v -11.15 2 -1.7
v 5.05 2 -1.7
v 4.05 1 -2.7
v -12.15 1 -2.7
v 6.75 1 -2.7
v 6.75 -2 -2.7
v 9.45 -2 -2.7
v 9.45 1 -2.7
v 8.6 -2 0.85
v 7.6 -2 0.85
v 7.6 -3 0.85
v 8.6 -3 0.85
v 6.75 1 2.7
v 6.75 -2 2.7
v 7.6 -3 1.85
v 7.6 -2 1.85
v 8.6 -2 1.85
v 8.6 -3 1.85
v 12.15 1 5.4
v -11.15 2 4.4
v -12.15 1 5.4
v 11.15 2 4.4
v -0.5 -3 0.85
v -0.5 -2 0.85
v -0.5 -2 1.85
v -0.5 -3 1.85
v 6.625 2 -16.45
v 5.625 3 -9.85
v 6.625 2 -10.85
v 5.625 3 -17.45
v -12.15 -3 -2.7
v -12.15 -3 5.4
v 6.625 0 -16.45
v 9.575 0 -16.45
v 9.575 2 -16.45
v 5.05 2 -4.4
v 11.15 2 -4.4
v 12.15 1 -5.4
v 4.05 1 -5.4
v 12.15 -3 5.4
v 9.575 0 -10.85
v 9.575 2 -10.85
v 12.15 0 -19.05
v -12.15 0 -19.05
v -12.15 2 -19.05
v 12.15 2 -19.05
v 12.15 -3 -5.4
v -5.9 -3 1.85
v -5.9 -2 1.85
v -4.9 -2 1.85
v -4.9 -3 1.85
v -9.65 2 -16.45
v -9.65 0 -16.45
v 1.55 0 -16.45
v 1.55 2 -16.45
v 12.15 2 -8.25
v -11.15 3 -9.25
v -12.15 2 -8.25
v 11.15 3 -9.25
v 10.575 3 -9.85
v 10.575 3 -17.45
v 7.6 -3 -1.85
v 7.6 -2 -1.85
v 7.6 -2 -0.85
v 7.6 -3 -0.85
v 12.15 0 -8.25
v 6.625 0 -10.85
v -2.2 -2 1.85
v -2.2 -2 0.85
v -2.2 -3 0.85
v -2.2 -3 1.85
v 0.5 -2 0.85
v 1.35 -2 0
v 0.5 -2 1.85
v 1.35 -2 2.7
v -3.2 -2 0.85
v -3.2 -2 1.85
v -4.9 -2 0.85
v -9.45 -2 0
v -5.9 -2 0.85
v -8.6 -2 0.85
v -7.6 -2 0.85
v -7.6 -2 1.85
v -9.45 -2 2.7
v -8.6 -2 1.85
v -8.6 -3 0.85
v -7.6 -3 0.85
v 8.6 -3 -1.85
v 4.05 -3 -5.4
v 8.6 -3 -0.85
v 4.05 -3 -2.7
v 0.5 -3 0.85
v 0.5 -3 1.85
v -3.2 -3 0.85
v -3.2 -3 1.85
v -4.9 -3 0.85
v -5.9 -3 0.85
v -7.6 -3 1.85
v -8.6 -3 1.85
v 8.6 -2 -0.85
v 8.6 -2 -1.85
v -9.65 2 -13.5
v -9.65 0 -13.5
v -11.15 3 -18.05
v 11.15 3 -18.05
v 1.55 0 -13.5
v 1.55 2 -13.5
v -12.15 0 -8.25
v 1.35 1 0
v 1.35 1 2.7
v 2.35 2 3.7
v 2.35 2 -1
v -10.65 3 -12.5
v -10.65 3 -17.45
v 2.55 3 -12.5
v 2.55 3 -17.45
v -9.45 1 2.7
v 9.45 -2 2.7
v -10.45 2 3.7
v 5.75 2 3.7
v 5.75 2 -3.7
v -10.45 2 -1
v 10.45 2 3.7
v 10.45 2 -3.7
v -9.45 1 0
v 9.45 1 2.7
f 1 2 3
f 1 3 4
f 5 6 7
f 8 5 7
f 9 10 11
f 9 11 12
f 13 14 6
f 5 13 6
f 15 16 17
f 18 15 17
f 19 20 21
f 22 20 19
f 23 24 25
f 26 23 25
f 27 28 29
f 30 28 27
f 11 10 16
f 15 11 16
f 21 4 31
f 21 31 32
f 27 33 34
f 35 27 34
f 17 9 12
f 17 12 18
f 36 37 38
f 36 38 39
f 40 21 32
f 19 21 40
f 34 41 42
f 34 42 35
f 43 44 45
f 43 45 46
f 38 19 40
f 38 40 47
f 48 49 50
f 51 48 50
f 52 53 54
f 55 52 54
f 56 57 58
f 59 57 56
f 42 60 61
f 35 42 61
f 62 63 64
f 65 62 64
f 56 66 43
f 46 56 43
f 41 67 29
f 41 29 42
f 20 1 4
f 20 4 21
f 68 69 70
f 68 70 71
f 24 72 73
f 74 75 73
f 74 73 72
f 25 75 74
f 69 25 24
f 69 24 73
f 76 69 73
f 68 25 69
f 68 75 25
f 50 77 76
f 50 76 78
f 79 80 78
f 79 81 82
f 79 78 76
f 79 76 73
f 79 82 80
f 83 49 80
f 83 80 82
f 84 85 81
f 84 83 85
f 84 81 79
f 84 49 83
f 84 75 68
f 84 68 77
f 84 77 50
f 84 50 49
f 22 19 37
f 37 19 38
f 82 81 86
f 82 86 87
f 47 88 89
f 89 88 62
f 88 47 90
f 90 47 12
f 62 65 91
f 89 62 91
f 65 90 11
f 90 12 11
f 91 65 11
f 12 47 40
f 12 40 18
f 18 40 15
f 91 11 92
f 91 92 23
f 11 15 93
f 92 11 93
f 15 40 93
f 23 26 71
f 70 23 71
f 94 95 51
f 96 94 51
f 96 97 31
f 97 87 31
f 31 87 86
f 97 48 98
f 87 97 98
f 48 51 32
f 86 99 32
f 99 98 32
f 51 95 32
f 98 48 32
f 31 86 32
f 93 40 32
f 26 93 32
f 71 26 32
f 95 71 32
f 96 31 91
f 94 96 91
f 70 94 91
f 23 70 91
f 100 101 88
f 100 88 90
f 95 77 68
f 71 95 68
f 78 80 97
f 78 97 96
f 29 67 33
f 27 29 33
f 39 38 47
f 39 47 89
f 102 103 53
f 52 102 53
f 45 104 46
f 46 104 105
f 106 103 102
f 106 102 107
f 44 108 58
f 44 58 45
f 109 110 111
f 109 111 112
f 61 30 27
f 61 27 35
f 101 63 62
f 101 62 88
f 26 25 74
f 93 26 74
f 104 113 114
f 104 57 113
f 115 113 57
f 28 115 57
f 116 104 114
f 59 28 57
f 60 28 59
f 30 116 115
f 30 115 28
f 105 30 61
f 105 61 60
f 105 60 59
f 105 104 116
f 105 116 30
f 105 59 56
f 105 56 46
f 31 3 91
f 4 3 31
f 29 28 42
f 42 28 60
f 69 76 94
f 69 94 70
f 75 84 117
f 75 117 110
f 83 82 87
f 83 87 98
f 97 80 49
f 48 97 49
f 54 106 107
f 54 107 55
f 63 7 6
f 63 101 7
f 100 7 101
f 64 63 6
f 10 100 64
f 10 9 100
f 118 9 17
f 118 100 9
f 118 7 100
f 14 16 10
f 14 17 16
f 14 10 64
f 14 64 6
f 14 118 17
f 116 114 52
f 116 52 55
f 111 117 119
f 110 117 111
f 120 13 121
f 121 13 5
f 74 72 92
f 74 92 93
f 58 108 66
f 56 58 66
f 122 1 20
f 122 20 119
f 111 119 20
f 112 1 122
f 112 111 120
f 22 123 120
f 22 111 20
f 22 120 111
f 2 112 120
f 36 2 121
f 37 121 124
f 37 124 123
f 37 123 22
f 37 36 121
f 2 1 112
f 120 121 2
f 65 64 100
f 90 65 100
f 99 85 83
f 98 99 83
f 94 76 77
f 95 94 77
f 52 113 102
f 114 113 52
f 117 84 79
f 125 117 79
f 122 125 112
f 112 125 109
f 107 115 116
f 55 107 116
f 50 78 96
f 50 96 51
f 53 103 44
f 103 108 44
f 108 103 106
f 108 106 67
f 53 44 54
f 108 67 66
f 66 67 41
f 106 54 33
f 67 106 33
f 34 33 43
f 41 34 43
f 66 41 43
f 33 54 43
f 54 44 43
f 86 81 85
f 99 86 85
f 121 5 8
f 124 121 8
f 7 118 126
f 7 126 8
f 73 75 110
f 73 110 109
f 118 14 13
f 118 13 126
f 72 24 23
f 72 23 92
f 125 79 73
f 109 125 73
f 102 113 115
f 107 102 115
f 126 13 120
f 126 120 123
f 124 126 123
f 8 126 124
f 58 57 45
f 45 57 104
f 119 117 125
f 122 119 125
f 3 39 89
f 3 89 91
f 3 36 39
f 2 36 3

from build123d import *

# Parameters (mm, degrees)
BOSS_EXTRUDE1_DEPTH      = 2
BOSS_EXTRUDE1_DEPTH_BACK = 2
SKETCH1_W                = 2.7
SKETCH1_H                = 5.4
SKETCH1_W_2              = 10.8
SKETCH1_H_2              = 2.7
SKETCH2_W                = 1
SKETCH2_H                = 1
BOSS_EXTRUDE2_DEPTH      = 1
CHAMFER3_SIZE            = 1
SKETCH3_W                = 24.3
SKETCH3_H                = 10.8
SKETCH3_W_2              = 11.2
SKETCH3_H_2              = 2.95
SKETCH3_W_3              = 2.95
SKETCH3_H_3              = 5.6
BOSS_EXTRUDE3_DEPTH      = 3
CHAMFER4_SIZE            = 1


with BuildPart() as part:
    # Sketch1 → Boss-Extrude1 (new, two sides: drawn at the far end of the back side and taken through both)
    with BuildSketch(Plane(origin=(0, 0, 0), x_dir=(1, 0, 0), z_dir=(0, 1, 0)).offset(-BOSS_EXTRUDE1_DEPTH_BACK)):
        Polygon((-12.15, -5.4), (12.15, -5.4), (12.15, 5.4), (4.05, 5.4), (4.05, 2.7), (-12.15, 2.7), align=None)
        with Locations((8.1, 0)):
            Rectangle(SKETCH1_W, SKETCH1_H, mode=Mode.SUBTRACT)
        with Locations((-4.05, -1.35)):
            Rectangle(SKETCH1_W_2, SKETCH1_H_2, mode=Mode.SUBTRACT)
    extrude(amount=BOSS_EXTRUDE1_DEPTH + BOSS_EXTRUDE1_DEPTH_BACK)

    # Sketch2 → Boss-Extrude2 (add)
    with BuildSketch(Plane.XZ.offset(2)):
        Polygon((-12.15, 5.4), (12.15, 5.4), (12.15, -5.4), (4.05, -5.4), (4.05, -2.7), (-12.15, -2.7), align=None)
        with Locations((-8.1, 1.35)):
            Rectangle(SKETCH2_W, SKETCH2_H, mode=Mode.SUBTRACT)
        with Locations((-5.4, 1.35)):
            Rectangle(SKETCH2_W, SKETCH2_H, mode=Mode.SUBTRACT)
        with Locations((-2.7, 1.35)):
            Rectangle(SKETCH2_W, SKETCH2_H, mode=Mode.SUBTRACT)
        with Locations((0, 1.35)):
            Rectangle(SKETCH2_W, SKETCH2_H, mode=Mode.SUBTRACT)
        with Locations((8.1, 1.35)):
            Rectangle(SKETCH2_W, SKETCH2_H, mode=Mode.SUBTRACT)
        with Locations((8.1, -1.35)):
            Rectangle(SKETCH2_W, SKETCH2_H, mode=Mode.SUBTRACT)
    extrude(amount=BOSS_EXTRUDE2_DEPTH)

    # Chamfer3
    chamfer3_edges = [part.edges().sort_by_distance(p)[0] for p in [
        (-12.15, 2, 1.35),
        (0, 2, 5.4),
        (12.15, 2, 0),
        (8.1, 2, -5.4),
        (4.05, 2, -4.05),
        (-4.05, 2, -2.7),
        (6.75, 2, 0),
        (8.1, 2, 2.7),
        (9.45, 2, 0),
        (8.1, 2, -2.7),
        (-9.45, 2, 1.35),
        (-4.05, 2, 2.7),
        (1.35, 2, 1.35),
        (-4.05, 2, 0),
    ]]
    chamfer(chamfer3_edges, length=CHAMFER3_SIZE)


with BuildPart() as body_2:
    # Sketch3 → Boss-Extrude3 (new body)
    with BuildSketch(Plane(origin=(0, 0, 0), x_dir=(1, 0, 0), z_dir=(0, 1, 0))):
        with Locations((0, 13.65)):
            Rectangle(SKETCH3_W, SKETCH3_H)
        with Locations((-4.05, 14.975)):
            Rectangle(SKETCH3_W_2, SKETCH3_H_2, mode=Mode.SUBTRACT)
        with Locations((8.1, 13.65)):
            Rectangle(SKETCH3_W_3, SKETCH3_H_3, mode=Mode.SUBTRACT)
    extrude(amount=BOSS_EXTRUDE3_DEPTH)

    # Chamfer4
    chamfer4_edges = [body_2.edges().sort_by_distance(p)[0] for p in [
        (0, 3, -19.05),
        (-12.15, 3, -13.65),
        (0, 3, -8.25),
        (-4.05, 3, -16.45),
        (1.55, 3, -14.975),
        (-4.05, 3, -13.5),
        (-9.65, 3, -14.975),
        (8.1, 3, -16.45),
        (9.575, 3, -13.65),
        (8.1, 3, -10.85),
        (6.625, 3, -13.65),
        (12.15, 3, -13.65),
    ]]
    chamfer(chamfer4_edges, length=CHAMFER4_SIZE)


solid = Compound([part.part, body_2.part])
